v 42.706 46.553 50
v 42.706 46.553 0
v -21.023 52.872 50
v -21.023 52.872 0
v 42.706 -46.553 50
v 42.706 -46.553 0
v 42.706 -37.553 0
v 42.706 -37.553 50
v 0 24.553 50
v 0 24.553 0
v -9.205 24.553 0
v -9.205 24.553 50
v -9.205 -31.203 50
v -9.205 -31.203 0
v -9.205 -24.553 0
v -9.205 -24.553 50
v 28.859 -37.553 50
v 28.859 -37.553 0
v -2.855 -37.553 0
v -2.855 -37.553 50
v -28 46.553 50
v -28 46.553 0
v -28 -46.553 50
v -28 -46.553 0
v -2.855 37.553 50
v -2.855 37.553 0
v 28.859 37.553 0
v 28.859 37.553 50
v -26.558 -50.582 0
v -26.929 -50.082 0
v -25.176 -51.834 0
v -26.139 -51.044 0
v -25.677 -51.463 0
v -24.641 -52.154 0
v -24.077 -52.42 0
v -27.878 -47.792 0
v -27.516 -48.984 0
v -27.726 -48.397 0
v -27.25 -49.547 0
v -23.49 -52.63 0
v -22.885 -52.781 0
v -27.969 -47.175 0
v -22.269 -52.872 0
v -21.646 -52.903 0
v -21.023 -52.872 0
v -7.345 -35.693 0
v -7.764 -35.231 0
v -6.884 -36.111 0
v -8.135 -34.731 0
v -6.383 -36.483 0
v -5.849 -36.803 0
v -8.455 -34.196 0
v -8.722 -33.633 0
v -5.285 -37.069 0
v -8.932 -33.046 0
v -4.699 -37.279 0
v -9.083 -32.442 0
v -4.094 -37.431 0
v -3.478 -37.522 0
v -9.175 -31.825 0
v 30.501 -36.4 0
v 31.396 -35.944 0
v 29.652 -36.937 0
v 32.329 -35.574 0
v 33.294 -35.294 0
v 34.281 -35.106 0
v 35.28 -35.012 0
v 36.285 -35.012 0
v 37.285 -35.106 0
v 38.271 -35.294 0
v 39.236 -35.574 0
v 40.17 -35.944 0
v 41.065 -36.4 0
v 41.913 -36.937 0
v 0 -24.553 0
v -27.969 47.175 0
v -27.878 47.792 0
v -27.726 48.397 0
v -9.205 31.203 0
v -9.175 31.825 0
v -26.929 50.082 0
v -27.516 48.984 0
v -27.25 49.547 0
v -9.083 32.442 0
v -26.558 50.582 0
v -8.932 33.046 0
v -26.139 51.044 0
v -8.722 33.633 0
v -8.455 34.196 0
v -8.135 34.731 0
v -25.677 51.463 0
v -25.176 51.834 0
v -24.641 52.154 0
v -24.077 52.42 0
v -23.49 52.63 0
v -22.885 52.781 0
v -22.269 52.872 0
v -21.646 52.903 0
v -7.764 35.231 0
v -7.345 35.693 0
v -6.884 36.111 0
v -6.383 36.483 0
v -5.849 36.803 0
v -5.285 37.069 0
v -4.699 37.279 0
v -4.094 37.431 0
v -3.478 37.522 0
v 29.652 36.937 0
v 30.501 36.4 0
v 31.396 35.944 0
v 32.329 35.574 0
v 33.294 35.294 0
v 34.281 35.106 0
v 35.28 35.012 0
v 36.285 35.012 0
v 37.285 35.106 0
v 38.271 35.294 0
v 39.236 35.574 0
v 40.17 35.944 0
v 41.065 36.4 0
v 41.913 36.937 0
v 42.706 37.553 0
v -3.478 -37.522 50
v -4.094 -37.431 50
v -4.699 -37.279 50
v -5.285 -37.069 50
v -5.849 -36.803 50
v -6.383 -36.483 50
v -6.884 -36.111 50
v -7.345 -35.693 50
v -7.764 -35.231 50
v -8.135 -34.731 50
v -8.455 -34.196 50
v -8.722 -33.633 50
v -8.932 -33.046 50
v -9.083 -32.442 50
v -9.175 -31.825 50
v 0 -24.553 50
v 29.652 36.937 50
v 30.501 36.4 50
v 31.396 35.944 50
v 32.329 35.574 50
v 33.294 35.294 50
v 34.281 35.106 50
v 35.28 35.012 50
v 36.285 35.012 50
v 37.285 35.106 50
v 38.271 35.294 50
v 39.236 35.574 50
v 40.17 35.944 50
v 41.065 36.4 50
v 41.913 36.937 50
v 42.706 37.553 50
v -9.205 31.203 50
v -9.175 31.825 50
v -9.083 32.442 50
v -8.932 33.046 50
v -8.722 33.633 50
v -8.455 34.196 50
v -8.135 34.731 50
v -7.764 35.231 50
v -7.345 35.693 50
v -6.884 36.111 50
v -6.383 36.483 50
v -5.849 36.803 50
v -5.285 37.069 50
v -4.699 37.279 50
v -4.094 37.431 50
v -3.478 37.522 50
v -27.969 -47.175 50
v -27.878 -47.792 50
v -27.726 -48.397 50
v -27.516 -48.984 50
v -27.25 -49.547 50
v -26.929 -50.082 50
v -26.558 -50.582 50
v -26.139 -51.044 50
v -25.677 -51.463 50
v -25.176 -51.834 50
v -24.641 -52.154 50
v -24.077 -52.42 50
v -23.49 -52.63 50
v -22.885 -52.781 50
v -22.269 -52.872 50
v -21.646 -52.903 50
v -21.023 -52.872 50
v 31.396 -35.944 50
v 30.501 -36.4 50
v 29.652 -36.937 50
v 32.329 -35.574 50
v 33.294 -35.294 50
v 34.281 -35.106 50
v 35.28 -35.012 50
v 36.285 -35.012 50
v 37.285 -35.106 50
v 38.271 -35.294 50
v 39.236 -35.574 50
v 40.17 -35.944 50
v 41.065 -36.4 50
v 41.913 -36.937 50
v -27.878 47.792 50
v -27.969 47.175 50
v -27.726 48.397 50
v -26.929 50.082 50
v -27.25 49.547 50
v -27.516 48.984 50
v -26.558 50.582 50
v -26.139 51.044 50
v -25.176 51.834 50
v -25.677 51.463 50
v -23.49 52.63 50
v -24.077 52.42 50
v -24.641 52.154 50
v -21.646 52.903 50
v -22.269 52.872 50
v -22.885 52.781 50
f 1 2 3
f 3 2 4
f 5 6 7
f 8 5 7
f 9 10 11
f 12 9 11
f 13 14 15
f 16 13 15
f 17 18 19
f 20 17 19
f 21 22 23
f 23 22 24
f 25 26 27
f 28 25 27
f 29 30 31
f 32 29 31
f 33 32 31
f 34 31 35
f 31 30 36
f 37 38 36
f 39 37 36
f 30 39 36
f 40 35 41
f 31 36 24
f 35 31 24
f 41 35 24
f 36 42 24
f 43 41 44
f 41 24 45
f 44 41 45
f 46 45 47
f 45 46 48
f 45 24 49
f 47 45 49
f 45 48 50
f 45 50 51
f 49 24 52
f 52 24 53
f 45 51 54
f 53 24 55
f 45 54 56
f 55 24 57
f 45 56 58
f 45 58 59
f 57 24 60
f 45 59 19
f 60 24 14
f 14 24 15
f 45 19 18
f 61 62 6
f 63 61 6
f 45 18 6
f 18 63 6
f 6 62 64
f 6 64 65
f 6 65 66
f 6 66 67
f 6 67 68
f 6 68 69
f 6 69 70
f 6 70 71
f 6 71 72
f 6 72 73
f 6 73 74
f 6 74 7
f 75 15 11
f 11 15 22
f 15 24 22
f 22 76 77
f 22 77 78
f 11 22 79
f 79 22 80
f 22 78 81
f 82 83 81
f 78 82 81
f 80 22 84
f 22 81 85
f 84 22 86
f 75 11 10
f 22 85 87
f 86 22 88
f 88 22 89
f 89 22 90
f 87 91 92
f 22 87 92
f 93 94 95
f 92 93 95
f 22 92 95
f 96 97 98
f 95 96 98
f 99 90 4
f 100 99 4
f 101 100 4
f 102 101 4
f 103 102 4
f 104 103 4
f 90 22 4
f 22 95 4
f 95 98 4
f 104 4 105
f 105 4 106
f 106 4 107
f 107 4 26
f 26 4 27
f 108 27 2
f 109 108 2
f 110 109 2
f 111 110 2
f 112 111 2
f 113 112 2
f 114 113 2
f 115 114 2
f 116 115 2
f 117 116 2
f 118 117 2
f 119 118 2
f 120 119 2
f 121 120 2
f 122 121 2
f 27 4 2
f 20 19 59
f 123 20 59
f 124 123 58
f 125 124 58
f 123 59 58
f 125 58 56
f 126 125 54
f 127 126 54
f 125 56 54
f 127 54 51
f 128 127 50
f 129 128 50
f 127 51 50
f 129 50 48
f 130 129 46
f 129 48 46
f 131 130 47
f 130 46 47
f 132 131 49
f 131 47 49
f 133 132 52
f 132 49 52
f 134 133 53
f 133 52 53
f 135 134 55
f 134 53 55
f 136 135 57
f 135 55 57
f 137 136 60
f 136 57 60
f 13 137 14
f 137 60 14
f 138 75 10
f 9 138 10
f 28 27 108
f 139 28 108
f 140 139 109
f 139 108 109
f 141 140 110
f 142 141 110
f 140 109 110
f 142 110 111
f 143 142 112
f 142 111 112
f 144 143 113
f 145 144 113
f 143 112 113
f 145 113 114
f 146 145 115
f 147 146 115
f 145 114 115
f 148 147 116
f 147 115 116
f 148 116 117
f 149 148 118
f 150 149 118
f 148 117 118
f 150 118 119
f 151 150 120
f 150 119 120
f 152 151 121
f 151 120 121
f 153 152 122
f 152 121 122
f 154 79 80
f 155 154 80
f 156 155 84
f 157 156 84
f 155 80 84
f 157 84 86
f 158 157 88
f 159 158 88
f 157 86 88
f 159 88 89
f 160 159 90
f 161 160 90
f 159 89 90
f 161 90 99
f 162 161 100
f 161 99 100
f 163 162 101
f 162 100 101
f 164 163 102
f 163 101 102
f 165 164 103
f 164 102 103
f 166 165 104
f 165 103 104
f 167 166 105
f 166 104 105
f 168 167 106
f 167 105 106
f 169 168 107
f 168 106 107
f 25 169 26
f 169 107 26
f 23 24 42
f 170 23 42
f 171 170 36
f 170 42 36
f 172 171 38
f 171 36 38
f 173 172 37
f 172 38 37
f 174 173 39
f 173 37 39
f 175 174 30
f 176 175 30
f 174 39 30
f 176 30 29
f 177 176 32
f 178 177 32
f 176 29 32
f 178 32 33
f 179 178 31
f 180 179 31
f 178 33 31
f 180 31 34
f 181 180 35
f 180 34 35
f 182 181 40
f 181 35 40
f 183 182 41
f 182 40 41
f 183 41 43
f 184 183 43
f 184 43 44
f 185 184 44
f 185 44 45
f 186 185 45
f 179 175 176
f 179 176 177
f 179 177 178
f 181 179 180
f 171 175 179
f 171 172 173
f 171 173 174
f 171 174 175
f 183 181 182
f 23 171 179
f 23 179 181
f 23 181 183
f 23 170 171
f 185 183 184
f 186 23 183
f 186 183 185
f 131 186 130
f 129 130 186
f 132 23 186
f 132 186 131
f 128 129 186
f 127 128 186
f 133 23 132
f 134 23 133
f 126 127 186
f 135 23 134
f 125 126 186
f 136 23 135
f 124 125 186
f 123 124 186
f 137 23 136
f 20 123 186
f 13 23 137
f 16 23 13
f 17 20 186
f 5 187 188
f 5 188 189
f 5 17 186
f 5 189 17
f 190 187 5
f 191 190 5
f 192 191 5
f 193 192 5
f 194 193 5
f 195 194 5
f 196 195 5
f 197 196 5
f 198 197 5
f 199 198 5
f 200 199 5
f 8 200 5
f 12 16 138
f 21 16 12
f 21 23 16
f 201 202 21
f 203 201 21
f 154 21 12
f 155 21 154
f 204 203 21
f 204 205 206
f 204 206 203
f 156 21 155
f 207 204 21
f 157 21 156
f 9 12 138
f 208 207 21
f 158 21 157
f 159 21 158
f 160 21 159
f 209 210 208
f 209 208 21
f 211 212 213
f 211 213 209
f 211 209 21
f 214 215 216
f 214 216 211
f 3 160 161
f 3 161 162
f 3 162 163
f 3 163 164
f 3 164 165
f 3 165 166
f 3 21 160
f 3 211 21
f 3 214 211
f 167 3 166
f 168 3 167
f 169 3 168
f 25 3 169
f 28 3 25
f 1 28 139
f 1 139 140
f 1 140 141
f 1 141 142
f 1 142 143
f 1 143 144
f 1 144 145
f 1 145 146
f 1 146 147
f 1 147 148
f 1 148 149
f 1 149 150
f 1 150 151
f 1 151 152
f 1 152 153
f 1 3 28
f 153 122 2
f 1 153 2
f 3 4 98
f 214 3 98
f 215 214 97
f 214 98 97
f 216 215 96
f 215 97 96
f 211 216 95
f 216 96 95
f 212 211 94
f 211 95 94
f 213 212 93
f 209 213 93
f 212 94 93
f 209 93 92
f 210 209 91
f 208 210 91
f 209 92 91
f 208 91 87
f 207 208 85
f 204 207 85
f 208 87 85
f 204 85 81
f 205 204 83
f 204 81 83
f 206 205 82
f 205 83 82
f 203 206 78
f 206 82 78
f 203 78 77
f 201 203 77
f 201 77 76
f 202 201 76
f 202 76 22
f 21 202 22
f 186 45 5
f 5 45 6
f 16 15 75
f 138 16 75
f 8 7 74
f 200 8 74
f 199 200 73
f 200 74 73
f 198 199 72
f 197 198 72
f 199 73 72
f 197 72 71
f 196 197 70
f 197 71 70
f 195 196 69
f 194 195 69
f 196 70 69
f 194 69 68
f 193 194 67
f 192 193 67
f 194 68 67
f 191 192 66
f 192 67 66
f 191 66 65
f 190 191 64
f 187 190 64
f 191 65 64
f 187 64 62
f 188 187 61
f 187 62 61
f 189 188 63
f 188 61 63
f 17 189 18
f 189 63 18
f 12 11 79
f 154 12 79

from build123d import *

# Parameters (mm, degrees)
F1_DEPTH = 50


# Not quite as in the source:
# - a feature names something its author has since deleted; it is built from what else it names


with BuildPart() as f1:
    # F0 (on Top) → F1 (new body)
    with BuildSketch(Plane.XY):
        Polygon((-28, 24.552706346), (-28, 0), (0, 0), (0, 24.552706346), (-9.2052005051, 24.552706346), align=None)
        with BuildLine():
            Line((-28, 46.552706346), (-28, 24.552706346))
            Line((-28, 24.552706346), (-9.2052005051, 24.552706346))
            Line((-9.2052005051, 24.552706346), (-9.2052005051, 31.202706346))
            ThreePointArc((-9.2052005051, 31.202706346), (-7.3453285656, 35.6928344065), (-2.8552005051, 37.552706346))
            Line((-2.8552005051, 37.552706346), (28.8586538925, 37.552706346))
            Line((28.8586538925, 37.552706346), (42.7064734879, 37.552706346))
            Line((42.7064734879, 37.552706346), (42.7064734879, 46.552706346))
            Line((42.7064734879, 46.552706346), (-28, 46.552706346))
        make_face()
        with BuildLine():
            ThreePointArc((28.8586538925, 37.552706346), (35.7825636902, 35), (42.7064734879, 37.552706346))
            Line((42.7064734879, 37.552706346), (28.8586538925, 37.552706346))
        make_face()
        with BuildLine():
            ThreePointArc((-21.0234507531, 52.8717201964), (-25.9128577435, 51.2591427749), (-28, 46.552706346))
            Line((-28, 46.552706346), (42.7064734879, 46.552706346))
            Line((42.7064734879, 46.552706346), (-21.0234507531, 52.8717201964))
        make_face()
        Polygon((0, 0), (-28, 0), (-28, -24.552706346), (-9.2052005051, -24.552706346), (0, -24.552706346), align=None)
        with BuildLine():
            Line((-9.2052005051, -24.552706346), (-28, -24.552706346))
            Line((-28, -24.552706346), (-28, -46.552706346))
            Line((-28, -46.552706346), (42.7064734879, -46.552706346))
            Line((42.7064734879, -46.552706346), (42.7064734879, -37.552706346))
            Line((42.7064734879, -37.552706346), (28.8586538925, -37.552706346))
            Line((28.8586538925, -37.552706346), (-2.8552005051, -37.552706346))
            ThreePointArc((-2.8552005051, -37.552706346), (-7.3453285656, -35.6928344065), (-9.2052005051, -31.202706346))
            Line((-9.2052005051, -31.202706346), (-9.2052005051, -24.552706346))
        make_face()
        with BuildLine():
            Line((42.7064734879, -46.552706346), (-28, -46.552706346))
            ThreePointArc((-28, -46.552706346), (-25.9128577435, -51.2591427749), (-21.0234507531, -52.8717201964))
            Line((-21.0234507531, -52.8717201964), (42.7064734879, -46.552706346))
        make_face()
        with BuildLine():
            Line((28.8586538925, -37.552706346), (42.7064734879, -37.552706346))
            ThreePointArc((42.7064734879, -37.552706346), (35.7825636902, -35), (28.8586538925, -37.552706346))
        make_face()
    extrude(amount=F1_DEPTH)


solid = f1.part
